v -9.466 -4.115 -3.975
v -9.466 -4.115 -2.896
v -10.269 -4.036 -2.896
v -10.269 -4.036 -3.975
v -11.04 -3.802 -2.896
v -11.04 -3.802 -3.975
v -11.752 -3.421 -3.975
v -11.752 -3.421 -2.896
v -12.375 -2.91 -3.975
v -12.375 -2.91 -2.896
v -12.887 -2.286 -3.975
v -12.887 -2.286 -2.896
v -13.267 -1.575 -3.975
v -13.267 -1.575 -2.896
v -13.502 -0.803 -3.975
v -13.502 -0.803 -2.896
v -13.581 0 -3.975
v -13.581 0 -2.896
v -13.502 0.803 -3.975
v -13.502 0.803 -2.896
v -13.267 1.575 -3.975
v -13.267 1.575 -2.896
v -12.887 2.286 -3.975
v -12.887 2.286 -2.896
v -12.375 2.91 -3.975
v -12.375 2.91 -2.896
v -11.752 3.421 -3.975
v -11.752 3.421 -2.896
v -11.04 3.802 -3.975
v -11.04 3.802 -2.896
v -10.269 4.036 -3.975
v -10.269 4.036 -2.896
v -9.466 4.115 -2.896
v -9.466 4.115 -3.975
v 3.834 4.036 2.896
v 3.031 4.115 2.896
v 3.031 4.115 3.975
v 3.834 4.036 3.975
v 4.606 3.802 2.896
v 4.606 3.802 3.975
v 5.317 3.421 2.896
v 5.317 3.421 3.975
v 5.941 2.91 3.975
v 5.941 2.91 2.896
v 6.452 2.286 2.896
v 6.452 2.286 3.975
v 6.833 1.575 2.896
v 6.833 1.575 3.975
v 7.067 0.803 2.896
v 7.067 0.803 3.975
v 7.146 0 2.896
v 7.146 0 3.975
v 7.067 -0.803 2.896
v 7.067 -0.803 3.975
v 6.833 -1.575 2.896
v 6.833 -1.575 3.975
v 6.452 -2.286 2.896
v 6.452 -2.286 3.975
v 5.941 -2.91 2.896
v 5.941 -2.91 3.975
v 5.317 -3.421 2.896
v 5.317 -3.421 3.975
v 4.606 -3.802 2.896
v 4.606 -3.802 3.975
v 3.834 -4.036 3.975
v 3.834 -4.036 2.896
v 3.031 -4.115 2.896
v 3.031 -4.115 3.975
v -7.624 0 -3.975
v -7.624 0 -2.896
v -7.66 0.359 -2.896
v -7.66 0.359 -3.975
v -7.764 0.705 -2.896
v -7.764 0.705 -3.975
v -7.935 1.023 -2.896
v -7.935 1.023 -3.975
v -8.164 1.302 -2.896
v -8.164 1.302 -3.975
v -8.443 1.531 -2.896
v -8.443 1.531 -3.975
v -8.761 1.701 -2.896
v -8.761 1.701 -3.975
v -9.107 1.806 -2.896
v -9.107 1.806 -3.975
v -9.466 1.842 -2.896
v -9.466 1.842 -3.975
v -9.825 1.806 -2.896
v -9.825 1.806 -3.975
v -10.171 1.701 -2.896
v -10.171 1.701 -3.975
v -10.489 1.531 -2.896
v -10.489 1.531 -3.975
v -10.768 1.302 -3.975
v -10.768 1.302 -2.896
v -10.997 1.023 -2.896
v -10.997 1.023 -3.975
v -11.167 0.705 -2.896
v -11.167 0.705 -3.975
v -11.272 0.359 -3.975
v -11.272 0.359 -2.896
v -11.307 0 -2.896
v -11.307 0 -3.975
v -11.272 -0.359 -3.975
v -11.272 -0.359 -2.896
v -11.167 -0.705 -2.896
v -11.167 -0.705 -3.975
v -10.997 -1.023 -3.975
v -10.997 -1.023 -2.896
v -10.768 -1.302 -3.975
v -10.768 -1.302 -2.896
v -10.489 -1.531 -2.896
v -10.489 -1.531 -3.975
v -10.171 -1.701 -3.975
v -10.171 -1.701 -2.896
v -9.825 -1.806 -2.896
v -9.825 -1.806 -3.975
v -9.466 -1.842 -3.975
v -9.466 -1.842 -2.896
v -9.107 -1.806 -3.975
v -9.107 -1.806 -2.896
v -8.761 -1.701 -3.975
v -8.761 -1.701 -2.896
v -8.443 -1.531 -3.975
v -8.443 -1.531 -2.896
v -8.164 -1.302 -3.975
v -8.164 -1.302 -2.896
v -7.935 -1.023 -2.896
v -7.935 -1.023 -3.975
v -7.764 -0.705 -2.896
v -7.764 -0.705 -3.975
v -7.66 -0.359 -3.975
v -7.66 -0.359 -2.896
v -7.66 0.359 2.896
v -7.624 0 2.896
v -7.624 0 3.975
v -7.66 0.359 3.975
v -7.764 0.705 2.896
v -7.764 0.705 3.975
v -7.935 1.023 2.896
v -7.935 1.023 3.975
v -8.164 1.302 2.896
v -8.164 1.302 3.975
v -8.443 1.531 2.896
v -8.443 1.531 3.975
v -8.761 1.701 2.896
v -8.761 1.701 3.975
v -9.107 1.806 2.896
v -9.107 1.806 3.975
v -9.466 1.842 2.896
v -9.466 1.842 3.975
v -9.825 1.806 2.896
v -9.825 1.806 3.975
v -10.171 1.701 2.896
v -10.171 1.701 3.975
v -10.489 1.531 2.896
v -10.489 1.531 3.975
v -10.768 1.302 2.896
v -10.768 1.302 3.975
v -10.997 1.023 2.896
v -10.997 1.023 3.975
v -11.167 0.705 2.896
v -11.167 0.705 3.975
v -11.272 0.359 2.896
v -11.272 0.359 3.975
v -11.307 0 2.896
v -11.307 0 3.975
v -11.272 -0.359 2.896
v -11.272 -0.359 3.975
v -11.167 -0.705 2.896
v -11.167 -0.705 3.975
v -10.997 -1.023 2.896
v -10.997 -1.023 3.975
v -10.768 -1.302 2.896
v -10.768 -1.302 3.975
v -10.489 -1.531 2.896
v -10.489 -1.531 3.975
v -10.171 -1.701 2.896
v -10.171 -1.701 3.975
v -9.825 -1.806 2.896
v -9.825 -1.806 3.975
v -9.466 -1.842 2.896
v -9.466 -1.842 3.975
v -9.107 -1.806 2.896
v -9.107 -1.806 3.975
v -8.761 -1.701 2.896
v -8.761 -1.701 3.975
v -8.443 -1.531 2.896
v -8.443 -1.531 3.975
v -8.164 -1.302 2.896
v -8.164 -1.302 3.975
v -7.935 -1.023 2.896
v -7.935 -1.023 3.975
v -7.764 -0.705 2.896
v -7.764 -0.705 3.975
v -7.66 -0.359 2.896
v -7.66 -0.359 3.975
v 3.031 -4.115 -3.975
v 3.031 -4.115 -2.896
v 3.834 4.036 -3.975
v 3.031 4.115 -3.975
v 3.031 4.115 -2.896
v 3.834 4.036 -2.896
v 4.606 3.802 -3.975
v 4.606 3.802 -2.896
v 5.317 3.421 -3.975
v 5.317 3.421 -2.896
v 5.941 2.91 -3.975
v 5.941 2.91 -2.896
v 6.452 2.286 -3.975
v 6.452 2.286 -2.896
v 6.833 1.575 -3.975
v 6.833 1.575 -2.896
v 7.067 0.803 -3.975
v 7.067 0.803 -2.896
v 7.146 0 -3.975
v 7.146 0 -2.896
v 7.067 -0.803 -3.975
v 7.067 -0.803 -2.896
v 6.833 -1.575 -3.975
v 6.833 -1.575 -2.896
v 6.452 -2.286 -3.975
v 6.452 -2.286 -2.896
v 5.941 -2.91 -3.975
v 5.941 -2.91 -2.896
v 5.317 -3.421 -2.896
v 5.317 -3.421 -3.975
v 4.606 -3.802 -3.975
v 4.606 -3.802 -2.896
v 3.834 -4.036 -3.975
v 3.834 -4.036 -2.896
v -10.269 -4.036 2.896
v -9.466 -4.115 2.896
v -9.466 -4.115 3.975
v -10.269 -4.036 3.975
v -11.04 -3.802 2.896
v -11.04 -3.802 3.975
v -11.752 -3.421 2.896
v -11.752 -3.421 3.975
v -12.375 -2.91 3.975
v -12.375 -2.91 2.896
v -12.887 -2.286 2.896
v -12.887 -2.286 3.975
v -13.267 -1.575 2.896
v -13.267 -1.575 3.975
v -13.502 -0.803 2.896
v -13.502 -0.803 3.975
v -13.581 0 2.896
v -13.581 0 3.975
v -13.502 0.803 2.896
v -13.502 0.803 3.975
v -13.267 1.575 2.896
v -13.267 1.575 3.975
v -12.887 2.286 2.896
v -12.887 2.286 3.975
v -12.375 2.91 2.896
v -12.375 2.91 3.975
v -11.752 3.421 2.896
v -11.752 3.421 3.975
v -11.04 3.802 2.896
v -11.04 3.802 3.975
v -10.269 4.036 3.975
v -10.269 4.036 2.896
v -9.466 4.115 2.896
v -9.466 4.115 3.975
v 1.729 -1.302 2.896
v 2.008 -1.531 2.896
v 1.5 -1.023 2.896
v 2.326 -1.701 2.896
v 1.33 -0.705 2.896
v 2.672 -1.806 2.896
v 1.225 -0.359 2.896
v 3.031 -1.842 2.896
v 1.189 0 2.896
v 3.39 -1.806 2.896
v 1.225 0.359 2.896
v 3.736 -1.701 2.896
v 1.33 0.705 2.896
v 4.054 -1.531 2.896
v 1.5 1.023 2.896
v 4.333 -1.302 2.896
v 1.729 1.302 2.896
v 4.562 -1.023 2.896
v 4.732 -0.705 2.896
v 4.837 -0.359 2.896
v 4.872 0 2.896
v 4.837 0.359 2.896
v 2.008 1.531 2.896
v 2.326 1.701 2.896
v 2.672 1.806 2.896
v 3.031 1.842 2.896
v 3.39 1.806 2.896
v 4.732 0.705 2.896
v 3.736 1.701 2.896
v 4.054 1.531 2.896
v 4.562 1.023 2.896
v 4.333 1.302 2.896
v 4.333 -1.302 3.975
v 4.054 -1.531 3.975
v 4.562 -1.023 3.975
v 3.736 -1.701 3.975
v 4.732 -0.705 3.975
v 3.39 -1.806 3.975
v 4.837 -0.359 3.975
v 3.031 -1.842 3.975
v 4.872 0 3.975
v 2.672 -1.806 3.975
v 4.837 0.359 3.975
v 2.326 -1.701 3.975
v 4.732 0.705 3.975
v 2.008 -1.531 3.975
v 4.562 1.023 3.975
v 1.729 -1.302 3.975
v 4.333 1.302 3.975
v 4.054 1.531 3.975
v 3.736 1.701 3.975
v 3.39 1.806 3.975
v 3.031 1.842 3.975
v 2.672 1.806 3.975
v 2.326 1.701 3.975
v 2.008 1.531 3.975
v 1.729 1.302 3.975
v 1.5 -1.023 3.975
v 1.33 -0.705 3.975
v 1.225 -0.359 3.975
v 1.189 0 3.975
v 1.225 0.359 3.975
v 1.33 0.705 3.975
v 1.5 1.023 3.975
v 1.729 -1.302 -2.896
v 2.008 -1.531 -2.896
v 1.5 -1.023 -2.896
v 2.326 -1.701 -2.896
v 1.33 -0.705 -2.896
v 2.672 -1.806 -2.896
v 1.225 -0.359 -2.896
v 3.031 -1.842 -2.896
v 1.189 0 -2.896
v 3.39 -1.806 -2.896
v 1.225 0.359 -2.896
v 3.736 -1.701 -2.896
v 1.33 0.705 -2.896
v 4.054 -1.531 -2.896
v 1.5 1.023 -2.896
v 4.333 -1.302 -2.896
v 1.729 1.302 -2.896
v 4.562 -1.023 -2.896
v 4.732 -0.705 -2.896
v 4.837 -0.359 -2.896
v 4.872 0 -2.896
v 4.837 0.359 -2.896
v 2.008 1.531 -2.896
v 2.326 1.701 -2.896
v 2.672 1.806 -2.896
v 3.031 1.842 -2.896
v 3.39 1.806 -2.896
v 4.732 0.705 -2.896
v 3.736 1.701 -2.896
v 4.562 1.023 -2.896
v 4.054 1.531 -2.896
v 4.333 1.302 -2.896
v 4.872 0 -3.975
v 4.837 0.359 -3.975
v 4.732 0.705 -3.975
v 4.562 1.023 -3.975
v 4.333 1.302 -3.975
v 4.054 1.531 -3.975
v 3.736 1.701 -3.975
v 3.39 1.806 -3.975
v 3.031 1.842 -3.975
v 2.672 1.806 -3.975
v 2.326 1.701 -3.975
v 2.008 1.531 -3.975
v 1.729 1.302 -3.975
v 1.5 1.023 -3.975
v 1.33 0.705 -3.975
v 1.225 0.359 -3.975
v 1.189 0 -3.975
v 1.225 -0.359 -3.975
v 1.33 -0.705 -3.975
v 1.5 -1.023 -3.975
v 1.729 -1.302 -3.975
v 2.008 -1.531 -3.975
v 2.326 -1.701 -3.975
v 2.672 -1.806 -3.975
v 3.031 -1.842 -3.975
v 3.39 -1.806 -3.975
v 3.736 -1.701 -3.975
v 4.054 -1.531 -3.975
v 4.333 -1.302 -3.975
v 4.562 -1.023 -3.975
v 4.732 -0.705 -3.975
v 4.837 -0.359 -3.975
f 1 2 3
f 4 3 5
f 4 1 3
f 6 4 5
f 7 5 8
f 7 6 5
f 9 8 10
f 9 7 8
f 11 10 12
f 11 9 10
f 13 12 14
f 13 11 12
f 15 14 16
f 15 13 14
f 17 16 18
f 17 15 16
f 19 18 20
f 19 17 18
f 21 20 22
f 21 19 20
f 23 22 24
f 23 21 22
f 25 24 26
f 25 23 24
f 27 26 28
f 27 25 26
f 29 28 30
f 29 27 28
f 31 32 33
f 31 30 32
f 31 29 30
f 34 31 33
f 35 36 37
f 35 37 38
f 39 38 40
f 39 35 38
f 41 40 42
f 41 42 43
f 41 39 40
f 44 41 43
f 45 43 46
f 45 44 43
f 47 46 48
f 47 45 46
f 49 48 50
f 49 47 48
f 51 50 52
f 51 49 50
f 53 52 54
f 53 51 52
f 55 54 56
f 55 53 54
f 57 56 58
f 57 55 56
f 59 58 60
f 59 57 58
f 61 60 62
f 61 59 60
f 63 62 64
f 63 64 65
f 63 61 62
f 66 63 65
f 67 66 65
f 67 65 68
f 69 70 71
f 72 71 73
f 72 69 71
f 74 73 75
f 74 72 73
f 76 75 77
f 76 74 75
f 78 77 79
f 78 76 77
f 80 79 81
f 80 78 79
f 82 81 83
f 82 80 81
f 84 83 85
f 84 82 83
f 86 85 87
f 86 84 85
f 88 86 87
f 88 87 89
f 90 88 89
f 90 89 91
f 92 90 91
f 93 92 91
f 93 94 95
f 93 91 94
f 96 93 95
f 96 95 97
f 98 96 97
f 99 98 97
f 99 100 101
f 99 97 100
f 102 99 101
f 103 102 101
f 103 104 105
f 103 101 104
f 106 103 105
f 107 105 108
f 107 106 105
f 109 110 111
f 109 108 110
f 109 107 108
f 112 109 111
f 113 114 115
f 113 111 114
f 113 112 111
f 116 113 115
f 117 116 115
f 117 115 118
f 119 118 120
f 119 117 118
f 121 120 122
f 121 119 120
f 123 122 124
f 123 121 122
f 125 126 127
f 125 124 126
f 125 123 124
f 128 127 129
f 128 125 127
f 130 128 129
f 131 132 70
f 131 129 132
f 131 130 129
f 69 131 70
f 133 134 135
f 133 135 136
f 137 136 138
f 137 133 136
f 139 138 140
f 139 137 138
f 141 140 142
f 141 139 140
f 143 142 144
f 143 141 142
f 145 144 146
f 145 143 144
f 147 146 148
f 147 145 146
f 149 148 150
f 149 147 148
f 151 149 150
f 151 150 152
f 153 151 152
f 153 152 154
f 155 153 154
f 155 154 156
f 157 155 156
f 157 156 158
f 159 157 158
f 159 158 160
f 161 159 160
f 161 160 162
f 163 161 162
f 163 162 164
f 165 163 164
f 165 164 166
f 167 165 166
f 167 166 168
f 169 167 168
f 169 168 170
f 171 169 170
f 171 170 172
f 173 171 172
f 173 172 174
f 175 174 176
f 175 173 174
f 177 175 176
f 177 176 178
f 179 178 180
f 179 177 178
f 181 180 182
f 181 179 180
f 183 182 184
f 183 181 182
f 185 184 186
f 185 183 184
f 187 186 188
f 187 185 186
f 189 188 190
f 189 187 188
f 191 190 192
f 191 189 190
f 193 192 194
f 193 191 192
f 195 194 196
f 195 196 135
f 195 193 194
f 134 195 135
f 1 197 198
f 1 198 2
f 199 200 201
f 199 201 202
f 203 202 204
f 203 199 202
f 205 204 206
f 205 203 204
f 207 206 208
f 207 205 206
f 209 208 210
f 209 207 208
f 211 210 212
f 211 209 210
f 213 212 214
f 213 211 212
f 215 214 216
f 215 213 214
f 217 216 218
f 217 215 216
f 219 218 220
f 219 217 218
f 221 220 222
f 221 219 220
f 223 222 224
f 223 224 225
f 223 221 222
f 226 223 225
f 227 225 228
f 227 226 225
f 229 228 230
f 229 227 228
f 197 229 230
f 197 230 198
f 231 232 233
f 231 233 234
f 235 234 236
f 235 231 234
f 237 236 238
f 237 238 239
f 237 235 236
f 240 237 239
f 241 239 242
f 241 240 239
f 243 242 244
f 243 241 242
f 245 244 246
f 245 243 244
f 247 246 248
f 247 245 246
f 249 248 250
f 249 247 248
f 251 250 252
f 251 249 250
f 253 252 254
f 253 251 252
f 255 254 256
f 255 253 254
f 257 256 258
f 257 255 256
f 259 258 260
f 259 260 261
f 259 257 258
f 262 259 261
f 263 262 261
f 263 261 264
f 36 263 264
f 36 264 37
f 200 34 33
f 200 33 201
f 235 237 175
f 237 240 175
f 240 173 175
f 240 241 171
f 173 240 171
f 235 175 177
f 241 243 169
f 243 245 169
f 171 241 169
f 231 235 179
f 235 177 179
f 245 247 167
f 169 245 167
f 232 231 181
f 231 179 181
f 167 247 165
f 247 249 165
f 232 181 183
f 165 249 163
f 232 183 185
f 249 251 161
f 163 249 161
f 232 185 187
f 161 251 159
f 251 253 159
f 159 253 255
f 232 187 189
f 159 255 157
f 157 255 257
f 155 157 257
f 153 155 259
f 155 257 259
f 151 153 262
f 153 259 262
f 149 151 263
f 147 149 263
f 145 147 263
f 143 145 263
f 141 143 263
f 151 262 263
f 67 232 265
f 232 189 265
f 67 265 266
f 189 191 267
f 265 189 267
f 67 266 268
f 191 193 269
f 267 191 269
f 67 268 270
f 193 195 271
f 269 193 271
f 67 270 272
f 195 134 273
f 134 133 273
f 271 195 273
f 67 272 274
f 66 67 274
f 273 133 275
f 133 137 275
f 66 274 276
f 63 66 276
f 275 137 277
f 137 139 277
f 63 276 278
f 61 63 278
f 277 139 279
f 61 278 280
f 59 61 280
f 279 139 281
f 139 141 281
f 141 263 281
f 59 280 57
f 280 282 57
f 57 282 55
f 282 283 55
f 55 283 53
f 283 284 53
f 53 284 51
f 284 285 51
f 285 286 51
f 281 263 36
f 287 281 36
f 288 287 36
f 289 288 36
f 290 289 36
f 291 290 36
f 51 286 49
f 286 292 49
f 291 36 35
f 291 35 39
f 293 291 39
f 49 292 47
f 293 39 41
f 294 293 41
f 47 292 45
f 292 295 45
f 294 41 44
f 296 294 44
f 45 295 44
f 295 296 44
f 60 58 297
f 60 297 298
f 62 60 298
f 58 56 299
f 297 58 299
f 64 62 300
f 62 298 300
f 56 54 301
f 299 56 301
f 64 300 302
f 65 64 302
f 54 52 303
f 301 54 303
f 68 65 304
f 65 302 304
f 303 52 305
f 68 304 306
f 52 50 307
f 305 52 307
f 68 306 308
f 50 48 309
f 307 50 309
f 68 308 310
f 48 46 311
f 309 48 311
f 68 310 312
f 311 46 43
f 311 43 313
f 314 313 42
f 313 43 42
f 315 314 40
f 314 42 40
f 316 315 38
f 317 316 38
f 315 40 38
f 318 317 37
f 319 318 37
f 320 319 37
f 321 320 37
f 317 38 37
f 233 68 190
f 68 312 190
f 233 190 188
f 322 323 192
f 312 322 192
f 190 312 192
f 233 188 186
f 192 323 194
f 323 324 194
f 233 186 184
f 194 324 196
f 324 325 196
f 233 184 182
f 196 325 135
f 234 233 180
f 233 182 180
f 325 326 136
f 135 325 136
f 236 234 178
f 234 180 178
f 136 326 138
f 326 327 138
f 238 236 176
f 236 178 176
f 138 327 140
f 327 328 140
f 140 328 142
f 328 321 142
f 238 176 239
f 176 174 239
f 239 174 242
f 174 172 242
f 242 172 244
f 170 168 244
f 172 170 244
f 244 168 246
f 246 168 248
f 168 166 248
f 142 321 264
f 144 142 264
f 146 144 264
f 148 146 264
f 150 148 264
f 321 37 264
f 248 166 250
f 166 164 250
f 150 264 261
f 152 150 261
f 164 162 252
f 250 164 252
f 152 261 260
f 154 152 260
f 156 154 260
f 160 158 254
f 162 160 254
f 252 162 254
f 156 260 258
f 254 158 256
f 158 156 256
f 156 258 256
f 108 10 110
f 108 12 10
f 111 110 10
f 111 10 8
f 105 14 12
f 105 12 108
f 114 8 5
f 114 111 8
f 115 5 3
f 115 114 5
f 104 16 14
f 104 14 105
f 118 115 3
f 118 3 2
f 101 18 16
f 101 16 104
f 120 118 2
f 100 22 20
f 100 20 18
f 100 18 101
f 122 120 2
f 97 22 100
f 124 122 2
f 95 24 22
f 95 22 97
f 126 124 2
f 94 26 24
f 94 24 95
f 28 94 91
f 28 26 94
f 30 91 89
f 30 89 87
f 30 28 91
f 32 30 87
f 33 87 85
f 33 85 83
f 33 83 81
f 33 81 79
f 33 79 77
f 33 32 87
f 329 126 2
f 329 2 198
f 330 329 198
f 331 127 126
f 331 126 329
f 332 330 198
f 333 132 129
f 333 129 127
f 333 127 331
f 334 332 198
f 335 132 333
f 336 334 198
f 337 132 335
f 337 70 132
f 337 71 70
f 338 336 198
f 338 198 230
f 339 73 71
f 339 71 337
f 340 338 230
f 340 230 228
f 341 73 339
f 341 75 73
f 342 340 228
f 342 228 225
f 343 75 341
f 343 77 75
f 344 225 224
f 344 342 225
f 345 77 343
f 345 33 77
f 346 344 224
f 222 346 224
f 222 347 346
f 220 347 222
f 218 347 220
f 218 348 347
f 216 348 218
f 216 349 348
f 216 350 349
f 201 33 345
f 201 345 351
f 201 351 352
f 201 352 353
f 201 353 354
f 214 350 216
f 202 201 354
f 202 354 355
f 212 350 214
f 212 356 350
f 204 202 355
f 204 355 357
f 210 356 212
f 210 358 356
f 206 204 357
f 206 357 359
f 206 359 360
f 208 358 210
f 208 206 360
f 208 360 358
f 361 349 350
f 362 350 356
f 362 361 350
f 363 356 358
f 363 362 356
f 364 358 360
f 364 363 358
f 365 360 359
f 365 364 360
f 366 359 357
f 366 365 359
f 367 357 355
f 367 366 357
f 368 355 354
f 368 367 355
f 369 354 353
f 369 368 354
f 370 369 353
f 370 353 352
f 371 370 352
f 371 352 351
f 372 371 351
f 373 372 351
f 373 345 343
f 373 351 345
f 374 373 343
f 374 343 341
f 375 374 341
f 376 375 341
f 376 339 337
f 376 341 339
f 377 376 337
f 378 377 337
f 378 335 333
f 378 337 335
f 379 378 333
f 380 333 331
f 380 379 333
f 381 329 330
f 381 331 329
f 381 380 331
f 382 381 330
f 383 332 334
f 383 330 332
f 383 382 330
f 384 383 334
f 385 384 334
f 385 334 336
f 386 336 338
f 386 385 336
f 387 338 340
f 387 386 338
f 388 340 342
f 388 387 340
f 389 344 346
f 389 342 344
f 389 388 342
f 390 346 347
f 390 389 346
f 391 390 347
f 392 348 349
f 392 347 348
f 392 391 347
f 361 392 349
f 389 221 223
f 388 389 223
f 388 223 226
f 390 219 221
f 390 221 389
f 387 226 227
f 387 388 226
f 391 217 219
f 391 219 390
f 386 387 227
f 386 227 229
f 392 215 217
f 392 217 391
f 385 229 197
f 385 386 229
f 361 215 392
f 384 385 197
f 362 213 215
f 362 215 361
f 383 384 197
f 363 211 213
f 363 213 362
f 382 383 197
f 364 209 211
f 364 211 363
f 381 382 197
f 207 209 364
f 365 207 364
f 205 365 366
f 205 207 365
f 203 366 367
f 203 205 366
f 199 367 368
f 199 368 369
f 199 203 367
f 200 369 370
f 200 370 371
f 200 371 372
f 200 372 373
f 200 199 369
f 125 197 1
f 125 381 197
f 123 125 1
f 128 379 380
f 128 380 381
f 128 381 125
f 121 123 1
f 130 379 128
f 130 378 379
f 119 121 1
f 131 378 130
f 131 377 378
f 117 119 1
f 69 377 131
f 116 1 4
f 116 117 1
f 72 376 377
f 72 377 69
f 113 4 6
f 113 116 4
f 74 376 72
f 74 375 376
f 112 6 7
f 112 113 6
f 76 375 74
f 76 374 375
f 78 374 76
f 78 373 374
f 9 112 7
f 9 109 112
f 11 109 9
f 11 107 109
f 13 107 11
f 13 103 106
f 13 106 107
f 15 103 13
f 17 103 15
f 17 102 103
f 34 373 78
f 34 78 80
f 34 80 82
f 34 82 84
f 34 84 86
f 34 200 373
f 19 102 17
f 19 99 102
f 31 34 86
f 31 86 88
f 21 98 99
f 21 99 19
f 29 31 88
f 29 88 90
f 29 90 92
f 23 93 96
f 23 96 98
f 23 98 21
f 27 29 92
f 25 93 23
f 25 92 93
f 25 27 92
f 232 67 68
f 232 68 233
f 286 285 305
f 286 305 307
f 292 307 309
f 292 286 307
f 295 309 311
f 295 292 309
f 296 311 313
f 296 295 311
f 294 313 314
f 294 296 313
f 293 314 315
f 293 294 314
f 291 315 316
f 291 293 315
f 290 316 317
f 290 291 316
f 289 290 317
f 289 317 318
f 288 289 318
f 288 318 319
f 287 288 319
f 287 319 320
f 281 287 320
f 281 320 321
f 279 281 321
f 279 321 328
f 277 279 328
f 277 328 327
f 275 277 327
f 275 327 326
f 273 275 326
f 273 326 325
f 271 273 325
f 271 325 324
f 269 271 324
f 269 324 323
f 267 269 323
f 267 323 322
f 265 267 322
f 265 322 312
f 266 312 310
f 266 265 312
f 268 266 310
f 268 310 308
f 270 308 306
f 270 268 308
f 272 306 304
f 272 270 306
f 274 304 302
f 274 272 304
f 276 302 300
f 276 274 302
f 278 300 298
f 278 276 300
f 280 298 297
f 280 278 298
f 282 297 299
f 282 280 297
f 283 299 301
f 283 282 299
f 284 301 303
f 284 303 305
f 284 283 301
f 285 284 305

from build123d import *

# Parameters (mm, degrees)
BOSS_EXTRUDE1_DEPTH      = 3.9751
BOSS_EXTRUDE1_DEPTH_BACK = 3.9751
SKETCH2_R                = 1.8415
SKETCH3_W                = 20.7264
SKETCH3_H                = 5.7912
CUT_EXTRUDE1_DEPTH       = 17.369503444


with BuildPart() as part:
    # Sketch2 → Boss-Extrude1 (new, two sides: drawn at the far end of the back side and taken through both)
    with BuildSketch(Plane.XY.offset(-BOSS_EXTRUDE1_DEPTH_BACK)):
        with BuildLine():
            Line((-9.465807749, 4.1148), (3.030992251, 4.1148))
            ThreePointArc((3.030992251, 4.1148), (7.145792251, 0), (3.030992251, -4.1148))
            Line((3.030992251, -4.1148), (-9.465807749, -4.1148))
            ThreePointArc((-9.465807749, -4.1148), (-13.580607749, 0), (-9.465807749, 4.1148))
        make_face()
        with Locations((-9.465807749, 0)):
            Circle(SKETCH2_R, mode=Mode.SUBTRACT)
        with Locations((3.030992251, 0)):
            Circle(SKETCH2_R, mode=Mode.SUBTRACT)
    extrude(amount=BOSS_EXTRUDE1_DEPTH + BOSS_EXTRUDE1_DEPTH_BACK)

    # Sketch3 → Cut-Extrude1 (cut, through all)
    with BuildSketch(Plane(origin=(0, 4.1148, 0), x_dir=(1, 0, 0), z_dir=(0, 1, 0))):
        with Locations((-3.217407749, 0)):
            Rectangle(SKETCH3_W, SKETCH3_H)
    extrude(amount=-CUT_EXTRUDE1_DEPTH, mode=Mode.SUBTRACT)


with BuildPart() as cut_extrude1_piece_1:
    # of the separate pieces the step leaves, piece 1, a body of its own (cut_extrude1_pieces)
    add(part.part.solids().sort_by_distance((3.030992251, -4.1148, 2.8956))[0])


with BuildPart() as cut_extrude1_piece_2:
    # of the separate pieces the step leaves, piece 2, a body of its own (cut_extrude1_pieces)
    add(part.part.solids().sort_by_distance((3.030992251, -4.1148, -3.9751))[0])


solid = Compound([cut_extrude1_piece_1.part, cut_extrude1_piece_2.part])
